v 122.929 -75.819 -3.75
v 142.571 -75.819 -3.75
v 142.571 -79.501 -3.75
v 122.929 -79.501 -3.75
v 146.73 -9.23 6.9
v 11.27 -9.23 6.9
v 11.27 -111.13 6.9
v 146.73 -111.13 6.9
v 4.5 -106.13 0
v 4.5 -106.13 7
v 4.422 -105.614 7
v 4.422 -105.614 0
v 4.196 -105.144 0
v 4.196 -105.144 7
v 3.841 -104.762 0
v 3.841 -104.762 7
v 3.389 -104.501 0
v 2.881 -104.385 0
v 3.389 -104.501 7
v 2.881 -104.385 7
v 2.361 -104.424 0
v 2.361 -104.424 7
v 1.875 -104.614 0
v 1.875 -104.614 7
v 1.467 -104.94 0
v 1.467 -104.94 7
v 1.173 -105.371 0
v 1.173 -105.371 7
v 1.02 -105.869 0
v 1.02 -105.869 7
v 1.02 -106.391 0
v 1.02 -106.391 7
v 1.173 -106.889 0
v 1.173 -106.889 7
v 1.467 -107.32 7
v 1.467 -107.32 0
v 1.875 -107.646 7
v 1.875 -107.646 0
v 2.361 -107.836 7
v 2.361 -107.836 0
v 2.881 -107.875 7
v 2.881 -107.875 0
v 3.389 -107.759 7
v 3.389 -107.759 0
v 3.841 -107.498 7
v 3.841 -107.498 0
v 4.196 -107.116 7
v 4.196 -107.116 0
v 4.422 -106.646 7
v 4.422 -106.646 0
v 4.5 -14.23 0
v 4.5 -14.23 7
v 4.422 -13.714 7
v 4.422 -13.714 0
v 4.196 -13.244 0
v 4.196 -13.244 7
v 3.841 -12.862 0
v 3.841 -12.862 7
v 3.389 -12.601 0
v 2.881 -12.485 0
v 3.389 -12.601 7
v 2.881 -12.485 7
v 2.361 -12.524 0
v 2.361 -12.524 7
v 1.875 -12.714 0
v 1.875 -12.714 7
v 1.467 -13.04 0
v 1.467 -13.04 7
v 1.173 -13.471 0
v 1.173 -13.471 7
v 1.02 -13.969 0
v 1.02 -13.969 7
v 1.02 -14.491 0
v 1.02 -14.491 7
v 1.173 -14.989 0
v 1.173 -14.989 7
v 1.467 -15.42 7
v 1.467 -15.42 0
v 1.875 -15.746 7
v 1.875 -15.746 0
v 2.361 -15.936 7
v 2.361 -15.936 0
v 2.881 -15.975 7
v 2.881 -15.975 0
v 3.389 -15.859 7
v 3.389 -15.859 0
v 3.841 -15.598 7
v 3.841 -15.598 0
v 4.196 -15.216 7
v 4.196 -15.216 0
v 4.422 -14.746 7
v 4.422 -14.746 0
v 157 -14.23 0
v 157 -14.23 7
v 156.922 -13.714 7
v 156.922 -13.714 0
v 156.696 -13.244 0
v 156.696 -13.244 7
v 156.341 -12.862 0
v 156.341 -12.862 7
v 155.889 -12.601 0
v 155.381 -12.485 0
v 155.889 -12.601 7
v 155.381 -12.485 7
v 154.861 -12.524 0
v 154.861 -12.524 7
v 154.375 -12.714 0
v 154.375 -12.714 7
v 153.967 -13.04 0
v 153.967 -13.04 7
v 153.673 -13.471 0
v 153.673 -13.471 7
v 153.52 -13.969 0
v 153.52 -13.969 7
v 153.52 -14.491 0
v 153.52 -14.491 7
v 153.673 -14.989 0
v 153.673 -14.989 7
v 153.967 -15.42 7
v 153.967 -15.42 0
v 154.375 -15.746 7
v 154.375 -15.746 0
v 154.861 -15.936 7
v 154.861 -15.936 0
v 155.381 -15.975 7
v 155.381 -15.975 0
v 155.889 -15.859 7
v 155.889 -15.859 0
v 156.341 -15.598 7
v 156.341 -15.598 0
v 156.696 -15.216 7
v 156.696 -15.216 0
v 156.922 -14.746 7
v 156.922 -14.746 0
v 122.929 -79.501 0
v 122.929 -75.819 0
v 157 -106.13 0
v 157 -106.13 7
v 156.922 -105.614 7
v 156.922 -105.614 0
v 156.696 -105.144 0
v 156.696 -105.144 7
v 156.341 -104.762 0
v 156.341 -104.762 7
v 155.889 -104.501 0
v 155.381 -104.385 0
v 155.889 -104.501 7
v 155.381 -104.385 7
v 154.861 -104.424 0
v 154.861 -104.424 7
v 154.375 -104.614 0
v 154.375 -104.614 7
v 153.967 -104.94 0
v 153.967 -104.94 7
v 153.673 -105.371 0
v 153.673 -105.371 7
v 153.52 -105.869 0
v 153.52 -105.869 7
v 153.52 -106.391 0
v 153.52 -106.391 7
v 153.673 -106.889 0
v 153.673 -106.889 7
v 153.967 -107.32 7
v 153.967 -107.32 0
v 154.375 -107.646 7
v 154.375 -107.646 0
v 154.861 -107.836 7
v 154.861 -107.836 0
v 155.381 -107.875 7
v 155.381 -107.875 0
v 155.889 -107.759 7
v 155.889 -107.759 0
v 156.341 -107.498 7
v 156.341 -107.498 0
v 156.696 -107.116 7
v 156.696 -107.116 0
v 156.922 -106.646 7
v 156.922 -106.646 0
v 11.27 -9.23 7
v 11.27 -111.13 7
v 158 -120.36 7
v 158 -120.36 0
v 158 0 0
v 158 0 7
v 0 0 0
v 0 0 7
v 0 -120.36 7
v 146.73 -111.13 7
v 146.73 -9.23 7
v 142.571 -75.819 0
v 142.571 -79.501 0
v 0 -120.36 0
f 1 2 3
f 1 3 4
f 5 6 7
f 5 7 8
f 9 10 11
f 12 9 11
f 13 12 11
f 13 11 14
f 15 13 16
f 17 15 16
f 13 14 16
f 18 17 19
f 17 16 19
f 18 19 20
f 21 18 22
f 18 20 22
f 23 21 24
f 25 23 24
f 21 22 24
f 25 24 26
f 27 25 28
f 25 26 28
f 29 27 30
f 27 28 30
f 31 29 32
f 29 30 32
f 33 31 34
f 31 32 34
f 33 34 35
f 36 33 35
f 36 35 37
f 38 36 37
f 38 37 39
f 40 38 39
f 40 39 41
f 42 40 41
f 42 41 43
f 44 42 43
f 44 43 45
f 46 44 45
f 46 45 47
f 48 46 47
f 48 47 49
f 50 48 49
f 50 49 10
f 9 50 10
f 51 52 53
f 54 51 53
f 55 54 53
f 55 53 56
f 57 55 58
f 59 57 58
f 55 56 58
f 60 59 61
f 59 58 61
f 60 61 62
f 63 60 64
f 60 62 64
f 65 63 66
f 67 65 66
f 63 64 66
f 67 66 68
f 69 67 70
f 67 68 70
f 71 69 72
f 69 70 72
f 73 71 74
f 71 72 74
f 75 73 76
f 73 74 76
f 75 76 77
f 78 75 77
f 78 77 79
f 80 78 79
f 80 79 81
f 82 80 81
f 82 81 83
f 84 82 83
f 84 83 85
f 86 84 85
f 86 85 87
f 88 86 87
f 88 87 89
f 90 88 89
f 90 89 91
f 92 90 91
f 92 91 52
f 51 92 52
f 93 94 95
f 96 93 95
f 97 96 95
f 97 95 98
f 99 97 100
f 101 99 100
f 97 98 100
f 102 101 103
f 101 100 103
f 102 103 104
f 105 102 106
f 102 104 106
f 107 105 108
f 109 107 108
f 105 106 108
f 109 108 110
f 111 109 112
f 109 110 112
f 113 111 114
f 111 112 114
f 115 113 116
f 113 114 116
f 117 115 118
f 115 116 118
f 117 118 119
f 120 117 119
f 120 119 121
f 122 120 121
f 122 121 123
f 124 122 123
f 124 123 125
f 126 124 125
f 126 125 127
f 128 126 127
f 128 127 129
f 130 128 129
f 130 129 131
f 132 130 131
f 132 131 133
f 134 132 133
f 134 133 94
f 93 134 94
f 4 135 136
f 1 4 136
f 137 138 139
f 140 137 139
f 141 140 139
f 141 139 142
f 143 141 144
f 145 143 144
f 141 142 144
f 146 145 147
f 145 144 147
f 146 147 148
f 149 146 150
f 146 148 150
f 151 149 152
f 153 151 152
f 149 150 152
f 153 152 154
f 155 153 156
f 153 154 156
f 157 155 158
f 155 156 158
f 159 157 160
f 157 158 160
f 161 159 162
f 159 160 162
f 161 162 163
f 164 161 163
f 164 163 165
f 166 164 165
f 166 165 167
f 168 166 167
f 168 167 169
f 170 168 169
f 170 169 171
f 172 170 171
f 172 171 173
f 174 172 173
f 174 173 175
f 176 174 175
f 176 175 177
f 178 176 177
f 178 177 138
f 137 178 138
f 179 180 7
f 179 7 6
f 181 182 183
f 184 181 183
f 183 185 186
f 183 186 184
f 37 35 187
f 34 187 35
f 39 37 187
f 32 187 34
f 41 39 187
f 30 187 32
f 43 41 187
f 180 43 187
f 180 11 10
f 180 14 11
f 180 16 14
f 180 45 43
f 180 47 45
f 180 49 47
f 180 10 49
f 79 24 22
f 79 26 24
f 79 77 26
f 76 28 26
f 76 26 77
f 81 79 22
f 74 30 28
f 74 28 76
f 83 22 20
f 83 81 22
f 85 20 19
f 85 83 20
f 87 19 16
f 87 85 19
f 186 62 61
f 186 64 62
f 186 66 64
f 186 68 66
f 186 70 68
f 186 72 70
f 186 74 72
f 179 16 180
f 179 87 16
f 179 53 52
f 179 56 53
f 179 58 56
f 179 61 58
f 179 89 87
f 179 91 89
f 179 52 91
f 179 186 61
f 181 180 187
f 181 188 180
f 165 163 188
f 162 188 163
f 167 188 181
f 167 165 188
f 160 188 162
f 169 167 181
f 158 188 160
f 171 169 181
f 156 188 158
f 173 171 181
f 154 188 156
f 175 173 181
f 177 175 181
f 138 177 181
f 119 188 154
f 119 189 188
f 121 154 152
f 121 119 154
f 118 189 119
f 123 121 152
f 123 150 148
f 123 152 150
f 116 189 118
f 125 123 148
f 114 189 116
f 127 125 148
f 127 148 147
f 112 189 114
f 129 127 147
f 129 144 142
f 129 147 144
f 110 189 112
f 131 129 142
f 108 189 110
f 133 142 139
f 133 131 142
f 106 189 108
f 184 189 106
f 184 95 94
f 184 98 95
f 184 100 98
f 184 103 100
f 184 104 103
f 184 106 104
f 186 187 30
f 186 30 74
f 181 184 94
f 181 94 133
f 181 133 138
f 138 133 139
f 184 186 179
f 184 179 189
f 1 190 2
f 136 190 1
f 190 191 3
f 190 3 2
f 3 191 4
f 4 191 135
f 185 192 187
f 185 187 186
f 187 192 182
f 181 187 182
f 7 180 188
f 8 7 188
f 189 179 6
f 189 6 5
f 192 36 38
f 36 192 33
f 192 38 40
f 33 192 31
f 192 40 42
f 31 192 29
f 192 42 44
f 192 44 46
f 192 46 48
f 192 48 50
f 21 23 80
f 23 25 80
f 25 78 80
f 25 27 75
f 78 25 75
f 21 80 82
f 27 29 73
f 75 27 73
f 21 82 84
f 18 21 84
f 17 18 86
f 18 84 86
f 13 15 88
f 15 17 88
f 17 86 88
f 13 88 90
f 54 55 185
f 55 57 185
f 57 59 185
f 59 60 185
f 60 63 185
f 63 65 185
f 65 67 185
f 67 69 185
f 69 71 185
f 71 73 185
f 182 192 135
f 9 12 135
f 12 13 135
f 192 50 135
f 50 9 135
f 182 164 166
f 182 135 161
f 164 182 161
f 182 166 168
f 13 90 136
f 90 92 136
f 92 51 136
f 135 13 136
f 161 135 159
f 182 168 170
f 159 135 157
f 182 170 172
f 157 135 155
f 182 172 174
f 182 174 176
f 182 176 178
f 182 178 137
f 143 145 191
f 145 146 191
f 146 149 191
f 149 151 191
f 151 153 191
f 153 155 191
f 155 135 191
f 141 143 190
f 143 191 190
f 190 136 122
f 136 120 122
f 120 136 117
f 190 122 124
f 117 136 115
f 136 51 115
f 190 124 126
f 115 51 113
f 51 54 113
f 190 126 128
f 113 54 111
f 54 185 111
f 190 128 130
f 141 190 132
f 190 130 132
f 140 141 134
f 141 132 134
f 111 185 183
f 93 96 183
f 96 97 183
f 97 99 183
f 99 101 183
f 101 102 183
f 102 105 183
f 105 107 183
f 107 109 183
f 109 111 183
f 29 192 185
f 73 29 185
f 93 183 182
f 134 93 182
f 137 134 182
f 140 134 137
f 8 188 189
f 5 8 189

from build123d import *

# Parameters (mm, degrees)
SKETCH1_W                  = 158
SKETCH1_H                  = 120.36
EXTRUDE1_DEPTH             = 7
SKETCH2_W                  = 135.46
SKETCH2_H                  = 101.9
BEZEL_OPENING_DEPTH        = 0.1
SKETCH3_R                  = 1.75
MOUNT_HOLE_CUT_DEPTH       = 10
SKETCH4_W                  = 19.642579642
SKETCH4_H                  = 3.682983682
HIROSE_DF9_CONNECTOR_DEPTH = 3.75


with BuildPart() as part:
    # Sketch1 → Extrude1 (new body)
    with BuildSketch(Plane.XY):
        with Locations((79, -60.18)):
            Rectangle(SKETCH1_W, SKETCH1_H)
    extrude(amount=EXTRUDE1_DEPTH)

    # Sketch2 → Bezel Opening (cut)
    with BuildSketch(Plane.XY.offset(7)):
        with Locations((79, -60.18)):
            Rectangle(SKETCH2_W, SKETCH2_H)
    extrude(amount=-BEZEL_OPENING_DEPTH, mode=Mode.SUBTRACT)

    # Sketch3 → Mount hole cut (cut)
    with BuildSketch(Plane.XY.offset(7)):
        with Locations((155.25, -14.23)):
            Circle(SKETCH3_R)
        with Locations((155.25, -106.13)):
            Circle(SKETCH3_R)
        with Locations((2.75, -14.23)):
            Circle(SKETCH3_R)
        with Locations((2.75, -106.13)):
            Circle(SKETCH3_R)
    extrude(amount=-MOUNT_HOLE_CUT_DEPTH, mode=Mode.SUBTRACT)

    # Sketch4 → Hirose DF9 connector (add)
    with BuildSketch(Plane(origin=(0, 0, 0), x_dir=(-1, 0, 0), z_dir=(0, 0, -1))):
        with Locations((-132.75, -77.66)):
            Rectangle(SKETCH4_W, SKETCH4_H)
    extrude(amount=HIROSE_DF9_CONNECTOR_DEPTH)


solid = part.part
